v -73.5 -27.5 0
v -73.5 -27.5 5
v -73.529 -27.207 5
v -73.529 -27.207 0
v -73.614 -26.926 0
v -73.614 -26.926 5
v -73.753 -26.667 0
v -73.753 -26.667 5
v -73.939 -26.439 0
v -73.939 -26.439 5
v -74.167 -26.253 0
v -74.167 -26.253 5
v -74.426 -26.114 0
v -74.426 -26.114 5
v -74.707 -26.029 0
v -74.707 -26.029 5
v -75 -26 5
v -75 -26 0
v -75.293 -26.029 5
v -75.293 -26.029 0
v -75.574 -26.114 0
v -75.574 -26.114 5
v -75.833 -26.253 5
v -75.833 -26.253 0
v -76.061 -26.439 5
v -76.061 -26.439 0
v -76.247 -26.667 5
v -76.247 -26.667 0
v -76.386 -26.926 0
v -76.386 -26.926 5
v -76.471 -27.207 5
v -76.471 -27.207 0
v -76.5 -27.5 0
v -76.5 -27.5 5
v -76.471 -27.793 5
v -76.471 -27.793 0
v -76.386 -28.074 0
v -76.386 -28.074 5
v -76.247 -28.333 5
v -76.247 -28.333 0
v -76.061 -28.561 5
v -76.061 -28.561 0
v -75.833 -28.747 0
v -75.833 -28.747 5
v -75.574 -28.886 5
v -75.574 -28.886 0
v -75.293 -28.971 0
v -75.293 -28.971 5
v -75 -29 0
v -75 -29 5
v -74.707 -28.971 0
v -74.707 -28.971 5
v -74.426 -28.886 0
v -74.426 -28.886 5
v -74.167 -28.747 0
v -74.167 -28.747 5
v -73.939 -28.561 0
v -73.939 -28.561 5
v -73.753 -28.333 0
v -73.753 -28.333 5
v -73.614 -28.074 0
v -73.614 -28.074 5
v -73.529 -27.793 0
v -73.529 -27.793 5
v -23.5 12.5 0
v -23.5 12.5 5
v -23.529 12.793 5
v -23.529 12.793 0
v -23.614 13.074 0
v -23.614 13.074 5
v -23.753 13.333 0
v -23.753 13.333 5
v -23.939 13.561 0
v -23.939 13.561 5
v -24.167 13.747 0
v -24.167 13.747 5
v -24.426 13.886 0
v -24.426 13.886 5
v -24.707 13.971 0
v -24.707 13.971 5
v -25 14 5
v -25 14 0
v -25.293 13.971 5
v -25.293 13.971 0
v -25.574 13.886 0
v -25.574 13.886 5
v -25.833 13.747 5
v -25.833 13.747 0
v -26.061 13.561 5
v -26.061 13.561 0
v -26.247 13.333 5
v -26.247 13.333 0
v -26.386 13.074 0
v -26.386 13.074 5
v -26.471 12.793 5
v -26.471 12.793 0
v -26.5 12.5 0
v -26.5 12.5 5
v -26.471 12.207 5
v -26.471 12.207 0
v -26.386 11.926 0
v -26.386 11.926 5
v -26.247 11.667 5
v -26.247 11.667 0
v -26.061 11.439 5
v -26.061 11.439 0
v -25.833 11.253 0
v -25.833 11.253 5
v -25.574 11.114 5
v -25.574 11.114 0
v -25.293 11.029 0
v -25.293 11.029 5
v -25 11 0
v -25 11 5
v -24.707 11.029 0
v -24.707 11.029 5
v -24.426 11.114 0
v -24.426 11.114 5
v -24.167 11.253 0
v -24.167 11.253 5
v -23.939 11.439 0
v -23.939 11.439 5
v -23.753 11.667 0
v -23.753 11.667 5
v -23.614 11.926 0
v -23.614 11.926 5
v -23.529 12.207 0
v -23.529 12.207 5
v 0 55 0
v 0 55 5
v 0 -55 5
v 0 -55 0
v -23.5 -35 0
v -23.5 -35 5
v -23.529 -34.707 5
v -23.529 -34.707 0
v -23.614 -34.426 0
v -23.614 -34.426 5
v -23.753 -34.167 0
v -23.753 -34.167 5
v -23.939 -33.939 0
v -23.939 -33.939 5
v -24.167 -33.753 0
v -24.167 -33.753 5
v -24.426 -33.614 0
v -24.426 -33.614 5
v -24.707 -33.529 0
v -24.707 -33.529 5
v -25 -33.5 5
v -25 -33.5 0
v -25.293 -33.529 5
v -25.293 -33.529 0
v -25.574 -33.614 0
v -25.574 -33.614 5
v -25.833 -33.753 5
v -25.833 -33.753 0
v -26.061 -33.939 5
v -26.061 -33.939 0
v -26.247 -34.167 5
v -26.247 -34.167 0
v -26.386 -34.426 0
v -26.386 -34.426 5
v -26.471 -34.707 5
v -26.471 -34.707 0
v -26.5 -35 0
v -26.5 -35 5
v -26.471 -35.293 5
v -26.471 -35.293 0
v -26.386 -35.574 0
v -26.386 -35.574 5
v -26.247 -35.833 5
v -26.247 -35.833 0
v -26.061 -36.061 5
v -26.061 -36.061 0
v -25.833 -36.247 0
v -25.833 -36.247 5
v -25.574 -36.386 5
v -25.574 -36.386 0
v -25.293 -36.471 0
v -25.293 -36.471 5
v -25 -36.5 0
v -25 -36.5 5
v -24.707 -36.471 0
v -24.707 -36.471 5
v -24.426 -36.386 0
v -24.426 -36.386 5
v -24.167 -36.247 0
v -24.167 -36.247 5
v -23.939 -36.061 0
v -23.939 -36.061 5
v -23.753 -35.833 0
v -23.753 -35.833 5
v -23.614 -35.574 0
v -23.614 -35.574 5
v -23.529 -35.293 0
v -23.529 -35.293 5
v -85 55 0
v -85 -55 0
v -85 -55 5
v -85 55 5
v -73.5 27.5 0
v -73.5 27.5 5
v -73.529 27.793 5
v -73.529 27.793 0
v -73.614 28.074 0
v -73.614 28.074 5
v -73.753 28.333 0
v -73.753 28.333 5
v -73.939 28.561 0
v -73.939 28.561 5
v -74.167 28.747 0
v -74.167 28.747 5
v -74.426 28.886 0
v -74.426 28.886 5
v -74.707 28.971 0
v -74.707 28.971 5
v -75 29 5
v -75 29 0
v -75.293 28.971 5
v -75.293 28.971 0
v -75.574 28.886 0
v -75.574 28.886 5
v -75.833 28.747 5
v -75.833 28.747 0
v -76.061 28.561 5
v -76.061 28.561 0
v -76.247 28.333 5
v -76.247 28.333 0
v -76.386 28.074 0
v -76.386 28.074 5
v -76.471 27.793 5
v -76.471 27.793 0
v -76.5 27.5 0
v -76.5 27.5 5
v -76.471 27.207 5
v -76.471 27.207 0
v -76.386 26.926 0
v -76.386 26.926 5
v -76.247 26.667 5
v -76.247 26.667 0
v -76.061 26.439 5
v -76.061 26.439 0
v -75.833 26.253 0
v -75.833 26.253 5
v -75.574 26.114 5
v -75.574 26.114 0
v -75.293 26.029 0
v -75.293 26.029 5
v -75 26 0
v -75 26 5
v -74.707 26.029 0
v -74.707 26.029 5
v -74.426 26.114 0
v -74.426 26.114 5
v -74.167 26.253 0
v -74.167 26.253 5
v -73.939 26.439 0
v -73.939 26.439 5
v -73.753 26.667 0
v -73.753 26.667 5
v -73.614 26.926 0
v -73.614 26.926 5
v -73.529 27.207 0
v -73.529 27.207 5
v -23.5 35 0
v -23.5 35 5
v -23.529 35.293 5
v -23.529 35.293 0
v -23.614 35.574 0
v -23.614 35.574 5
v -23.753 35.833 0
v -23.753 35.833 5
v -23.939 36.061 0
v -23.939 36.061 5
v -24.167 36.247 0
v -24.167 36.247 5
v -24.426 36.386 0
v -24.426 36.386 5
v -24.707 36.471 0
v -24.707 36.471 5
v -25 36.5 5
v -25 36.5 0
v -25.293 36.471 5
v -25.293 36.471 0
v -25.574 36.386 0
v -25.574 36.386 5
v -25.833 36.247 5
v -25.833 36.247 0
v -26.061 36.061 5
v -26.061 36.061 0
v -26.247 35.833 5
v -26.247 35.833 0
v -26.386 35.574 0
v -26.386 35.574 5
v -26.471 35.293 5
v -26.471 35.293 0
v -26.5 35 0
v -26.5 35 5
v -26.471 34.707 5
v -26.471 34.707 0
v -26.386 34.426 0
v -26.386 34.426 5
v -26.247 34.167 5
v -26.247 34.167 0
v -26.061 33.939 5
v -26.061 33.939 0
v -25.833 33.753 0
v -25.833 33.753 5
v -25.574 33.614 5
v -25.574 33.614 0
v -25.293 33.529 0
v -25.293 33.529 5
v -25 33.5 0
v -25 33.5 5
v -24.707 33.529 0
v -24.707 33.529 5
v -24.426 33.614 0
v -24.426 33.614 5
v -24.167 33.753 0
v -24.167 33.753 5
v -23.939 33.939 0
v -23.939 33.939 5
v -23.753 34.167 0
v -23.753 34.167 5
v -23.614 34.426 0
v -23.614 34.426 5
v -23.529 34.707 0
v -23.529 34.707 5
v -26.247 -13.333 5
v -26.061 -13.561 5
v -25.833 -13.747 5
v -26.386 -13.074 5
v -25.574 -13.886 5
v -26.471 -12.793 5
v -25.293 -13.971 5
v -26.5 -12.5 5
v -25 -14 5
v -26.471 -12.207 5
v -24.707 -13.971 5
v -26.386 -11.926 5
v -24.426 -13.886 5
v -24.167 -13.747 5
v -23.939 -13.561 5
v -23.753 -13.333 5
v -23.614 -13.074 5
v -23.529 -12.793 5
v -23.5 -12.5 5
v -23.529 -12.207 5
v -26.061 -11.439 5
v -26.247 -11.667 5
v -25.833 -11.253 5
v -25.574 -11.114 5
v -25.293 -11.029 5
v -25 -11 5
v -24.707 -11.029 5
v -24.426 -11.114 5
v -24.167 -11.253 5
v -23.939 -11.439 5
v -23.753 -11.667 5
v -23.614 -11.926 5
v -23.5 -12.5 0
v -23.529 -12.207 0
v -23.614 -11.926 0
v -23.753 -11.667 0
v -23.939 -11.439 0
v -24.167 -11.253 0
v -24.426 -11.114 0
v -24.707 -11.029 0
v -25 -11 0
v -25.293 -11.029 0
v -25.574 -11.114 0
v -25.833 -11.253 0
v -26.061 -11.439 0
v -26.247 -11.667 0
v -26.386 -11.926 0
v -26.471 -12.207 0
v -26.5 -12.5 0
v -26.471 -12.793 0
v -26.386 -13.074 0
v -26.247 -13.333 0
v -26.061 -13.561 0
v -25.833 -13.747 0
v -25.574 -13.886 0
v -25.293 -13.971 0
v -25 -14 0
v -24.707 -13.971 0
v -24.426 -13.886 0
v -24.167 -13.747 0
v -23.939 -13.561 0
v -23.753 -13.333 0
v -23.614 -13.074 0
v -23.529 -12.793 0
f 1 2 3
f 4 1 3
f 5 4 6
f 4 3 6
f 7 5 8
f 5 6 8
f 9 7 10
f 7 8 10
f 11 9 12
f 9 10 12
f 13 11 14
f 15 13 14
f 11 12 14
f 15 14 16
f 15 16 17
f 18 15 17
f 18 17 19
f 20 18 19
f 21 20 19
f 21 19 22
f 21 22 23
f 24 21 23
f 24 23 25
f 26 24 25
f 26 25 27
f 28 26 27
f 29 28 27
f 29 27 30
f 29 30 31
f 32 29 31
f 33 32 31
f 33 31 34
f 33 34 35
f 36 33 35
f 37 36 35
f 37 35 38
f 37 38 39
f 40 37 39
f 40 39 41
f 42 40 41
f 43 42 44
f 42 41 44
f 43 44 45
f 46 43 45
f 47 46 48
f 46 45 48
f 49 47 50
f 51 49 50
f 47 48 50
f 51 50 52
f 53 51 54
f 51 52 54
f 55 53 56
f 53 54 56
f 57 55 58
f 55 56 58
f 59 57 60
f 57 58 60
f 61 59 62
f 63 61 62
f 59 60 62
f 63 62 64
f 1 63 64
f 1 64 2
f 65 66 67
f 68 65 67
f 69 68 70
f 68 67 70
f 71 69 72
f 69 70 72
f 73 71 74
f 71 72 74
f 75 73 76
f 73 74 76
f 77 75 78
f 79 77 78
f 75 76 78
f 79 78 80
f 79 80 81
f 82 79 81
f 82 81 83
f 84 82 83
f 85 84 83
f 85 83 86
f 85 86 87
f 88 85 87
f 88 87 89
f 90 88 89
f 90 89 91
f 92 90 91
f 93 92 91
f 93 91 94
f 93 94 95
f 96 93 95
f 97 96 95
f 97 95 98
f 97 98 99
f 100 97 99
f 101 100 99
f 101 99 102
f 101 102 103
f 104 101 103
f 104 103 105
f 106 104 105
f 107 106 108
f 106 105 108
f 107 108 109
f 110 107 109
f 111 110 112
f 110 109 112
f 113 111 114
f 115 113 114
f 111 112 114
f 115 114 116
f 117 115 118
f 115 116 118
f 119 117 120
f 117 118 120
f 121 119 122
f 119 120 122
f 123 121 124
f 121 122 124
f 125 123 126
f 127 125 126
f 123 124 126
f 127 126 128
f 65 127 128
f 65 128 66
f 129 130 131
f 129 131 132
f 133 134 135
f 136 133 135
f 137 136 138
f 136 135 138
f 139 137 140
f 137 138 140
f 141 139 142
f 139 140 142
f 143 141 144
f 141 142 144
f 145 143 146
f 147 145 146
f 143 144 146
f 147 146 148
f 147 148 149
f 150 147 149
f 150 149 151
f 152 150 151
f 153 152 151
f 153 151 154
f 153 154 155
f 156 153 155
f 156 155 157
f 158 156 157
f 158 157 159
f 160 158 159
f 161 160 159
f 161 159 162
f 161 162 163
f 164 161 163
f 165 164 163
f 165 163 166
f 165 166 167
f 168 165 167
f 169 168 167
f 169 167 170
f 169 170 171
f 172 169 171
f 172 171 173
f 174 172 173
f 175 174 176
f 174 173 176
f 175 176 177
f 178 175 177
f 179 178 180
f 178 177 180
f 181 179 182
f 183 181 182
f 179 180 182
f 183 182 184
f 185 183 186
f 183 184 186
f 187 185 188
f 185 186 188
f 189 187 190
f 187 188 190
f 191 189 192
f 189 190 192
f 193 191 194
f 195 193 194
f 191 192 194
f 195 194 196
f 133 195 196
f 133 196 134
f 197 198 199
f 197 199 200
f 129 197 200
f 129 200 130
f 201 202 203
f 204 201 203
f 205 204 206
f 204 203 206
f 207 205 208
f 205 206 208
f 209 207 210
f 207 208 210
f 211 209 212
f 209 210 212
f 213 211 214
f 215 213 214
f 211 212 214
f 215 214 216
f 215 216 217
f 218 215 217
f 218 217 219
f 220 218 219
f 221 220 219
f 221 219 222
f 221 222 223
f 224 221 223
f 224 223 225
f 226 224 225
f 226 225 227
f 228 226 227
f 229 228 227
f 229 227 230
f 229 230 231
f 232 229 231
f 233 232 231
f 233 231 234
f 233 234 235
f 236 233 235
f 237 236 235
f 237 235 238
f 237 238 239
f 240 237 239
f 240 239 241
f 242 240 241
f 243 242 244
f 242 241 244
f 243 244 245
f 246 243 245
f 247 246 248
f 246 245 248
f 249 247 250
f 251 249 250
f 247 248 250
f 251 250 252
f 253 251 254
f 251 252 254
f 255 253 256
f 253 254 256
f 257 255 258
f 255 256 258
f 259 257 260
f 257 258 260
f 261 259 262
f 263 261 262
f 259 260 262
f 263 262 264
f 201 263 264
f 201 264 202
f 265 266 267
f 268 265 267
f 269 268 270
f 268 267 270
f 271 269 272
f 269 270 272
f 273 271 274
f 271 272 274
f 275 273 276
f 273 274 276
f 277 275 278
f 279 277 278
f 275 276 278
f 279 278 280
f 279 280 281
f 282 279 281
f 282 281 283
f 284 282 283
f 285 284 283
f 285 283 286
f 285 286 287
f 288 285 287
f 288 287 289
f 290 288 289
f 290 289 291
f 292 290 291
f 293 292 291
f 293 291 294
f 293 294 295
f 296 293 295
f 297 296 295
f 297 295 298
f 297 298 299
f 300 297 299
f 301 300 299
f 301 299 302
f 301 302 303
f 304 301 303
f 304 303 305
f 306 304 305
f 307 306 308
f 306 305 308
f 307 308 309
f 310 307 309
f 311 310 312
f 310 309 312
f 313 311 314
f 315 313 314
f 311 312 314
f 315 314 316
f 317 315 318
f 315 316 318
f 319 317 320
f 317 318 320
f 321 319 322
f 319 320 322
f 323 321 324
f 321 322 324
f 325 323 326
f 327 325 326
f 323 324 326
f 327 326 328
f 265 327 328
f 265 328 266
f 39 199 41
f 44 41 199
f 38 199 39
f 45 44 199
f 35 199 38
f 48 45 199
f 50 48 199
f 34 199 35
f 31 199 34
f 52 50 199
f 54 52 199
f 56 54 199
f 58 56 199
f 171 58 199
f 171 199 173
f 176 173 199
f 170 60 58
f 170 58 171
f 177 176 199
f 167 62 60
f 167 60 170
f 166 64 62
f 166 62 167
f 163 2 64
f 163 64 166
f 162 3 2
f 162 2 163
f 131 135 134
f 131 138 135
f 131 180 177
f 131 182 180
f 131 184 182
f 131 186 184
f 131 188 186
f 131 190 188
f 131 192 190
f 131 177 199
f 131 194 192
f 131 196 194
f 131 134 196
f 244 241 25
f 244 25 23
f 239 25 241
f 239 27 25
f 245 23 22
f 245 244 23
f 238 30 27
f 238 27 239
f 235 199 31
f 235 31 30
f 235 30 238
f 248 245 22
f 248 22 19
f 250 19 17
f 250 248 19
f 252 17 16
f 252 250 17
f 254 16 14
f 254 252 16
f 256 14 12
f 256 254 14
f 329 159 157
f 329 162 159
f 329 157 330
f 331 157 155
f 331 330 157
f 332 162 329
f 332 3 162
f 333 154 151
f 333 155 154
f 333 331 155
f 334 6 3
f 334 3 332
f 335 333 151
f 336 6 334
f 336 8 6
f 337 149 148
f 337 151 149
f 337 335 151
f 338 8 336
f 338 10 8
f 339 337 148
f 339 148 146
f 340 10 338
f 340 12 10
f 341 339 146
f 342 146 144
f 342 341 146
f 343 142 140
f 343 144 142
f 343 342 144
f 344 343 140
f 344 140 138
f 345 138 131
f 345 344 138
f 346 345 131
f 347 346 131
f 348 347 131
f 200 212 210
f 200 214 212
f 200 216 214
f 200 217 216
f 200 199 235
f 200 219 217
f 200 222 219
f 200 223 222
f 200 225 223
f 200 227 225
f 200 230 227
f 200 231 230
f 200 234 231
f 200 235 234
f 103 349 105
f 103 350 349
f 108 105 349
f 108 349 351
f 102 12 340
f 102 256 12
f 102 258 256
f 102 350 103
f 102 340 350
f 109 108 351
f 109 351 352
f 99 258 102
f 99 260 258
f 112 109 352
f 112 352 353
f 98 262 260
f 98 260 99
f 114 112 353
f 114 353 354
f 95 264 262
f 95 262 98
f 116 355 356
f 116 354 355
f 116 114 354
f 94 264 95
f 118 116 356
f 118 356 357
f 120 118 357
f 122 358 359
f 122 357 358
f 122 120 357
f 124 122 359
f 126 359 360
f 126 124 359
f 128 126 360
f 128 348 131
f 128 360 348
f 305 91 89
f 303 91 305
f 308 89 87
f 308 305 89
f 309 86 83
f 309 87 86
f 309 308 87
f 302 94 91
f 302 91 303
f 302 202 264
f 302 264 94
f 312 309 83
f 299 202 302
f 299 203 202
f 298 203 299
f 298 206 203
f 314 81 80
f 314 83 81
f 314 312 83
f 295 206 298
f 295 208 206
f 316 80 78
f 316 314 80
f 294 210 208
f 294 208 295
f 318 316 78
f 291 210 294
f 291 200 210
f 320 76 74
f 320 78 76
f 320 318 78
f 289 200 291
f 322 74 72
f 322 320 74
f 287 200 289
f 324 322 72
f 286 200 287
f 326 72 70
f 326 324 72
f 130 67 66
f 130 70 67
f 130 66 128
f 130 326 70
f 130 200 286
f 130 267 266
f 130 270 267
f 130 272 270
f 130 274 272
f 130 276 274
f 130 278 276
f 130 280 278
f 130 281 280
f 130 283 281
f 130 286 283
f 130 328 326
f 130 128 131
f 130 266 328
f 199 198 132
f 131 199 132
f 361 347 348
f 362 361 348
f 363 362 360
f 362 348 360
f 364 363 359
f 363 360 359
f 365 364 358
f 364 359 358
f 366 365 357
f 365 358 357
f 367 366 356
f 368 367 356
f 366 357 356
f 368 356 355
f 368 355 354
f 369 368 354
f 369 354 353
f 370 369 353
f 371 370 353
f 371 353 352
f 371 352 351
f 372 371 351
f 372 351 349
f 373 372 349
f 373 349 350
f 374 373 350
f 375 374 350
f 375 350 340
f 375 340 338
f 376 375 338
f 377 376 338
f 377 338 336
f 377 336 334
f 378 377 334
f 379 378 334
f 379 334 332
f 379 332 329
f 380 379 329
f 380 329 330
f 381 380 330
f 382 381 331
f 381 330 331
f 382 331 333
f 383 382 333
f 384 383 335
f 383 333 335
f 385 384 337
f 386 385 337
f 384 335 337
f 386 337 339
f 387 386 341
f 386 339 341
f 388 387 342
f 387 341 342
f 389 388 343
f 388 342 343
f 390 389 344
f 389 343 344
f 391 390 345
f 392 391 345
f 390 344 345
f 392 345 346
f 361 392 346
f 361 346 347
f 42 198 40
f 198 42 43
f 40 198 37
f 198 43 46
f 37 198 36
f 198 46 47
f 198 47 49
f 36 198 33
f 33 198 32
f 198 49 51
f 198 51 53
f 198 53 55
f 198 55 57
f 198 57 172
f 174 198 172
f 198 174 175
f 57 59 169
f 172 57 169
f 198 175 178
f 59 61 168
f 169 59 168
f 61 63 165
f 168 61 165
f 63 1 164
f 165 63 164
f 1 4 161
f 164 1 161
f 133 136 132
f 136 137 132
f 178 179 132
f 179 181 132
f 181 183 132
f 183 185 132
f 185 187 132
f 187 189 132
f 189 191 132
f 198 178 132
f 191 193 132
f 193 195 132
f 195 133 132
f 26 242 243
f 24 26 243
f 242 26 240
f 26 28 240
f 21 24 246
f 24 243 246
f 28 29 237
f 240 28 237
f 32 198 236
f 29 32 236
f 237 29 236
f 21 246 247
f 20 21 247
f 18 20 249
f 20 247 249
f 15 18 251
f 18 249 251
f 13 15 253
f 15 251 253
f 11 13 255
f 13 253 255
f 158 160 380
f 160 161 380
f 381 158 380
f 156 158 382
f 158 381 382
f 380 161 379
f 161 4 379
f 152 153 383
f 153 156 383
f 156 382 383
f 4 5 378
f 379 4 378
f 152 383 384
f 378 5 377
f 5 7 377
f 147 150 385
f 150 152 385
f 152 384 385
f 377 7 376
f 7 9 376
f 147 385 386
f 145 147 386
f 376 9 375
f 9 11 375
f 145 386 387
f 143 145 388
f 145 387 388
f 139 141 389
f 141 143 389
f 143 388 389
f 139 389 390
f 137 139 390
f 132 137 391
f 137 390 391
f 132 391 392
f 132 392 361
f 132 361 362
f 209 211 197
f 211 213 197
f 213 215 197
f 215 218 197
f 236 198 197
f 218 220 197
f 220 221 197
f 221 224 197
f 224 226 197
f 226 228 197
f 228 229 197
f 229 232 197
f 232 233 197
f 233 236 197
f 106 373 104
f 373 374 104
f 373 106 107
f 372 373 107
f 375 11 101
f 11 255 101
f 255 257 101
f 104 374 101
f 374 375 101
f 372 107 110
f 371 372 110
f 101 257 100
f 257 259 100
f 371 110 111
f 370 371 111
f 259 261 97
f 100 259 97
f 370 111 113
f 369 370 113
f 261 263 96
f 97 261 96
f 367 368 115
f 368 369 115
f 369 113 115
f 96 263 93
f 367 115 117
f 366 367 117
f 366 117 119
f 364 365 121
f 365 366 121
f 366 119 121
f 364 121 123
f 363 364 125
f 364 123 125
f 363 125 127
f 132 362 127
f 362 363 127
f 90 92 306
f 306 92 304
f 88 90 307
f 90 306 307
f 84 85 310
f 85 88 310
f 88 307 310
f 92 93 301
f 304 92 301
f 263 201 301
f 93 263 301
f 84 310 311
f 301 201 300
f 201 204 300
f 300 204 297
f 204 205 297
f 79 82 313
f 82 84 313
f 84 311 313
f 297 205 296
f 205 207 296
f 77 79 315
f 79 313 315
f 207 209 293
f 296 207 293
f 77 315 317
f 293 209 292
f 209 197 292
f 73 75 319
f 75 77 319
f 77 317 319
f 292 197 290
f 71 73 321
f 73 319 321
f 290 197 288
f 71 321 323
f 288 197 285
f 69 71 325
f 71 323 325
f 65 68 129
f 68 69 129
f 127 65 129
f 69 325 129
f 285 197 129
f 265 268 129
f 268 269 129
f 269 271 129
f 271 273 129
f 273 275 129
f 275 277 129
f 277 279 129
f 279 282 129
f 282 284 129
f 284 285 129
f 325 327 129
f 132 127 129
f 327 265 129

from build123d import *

# Parameters (mm, degrees)
SKETCH1_W           = 170
SKETCH1_H           = 110
BOSS_EXTRUDE1_DEPTH = 5
SKETCH2_R           = 1.5
CUT_EXTRUDE1_DEPTH  = 6
SKETCH3_R           = 1.5
CUT_EXTRUDE2_DEPTH  = 6
SKETCH4_W           = 40.789310726
SKETCH4_H           = 120.699967799
CUT_EXTRUDE3_DEPTH  = 86


with BuildPart() as part:
    # Sketch1 → Boss-Extrude1 (new body)
    with BuildSketch(Plane.XY):
        Rectangle(SKETCH1_W, SKETCH1_H)
    extrude(amount=BOSS_EXTRUDE1_DEPTH)

    # Sketch2 → Cut-Extrude1 (cut, through all)
    with BuildSketch(Plane.XY.offset(5)):
        with Locations((-75, 27.5)):
            Circle(SKETCH2_R)
        with Locations((-75, -27.5)):
            Circle(SKETCH2_R)
        with Locations((75, -27.5)):
            Circle(SKETCH2_R)
        with Locations((75, 27.5)):
            Circle(SKETCH2_R)
    extrude(amount=-CUT_EXTRUDE1_DEPTH, mode=Mode.SUBTRACT)

    # Sketch3 → Cut-Extrude2 (cut, through all)
    with BuildSketch(Plane.XY.offset(5)):
        with Locations((-25, 35)):
            Circle(SKETCH3_R)
        with Locations((-25, 12.5)):
            Circle(SKETCH3_R)
        with Locations((-25, -12.5)):
            Circle(SKETCH3_R)
        with Locations((-25, -35)):
            Circle(SKETCH3_R)
        with Locations((25, -35)):
            Circle(SKETCH3_R)
        with Locations((25, -12.5)):
            Circle(SKETCH3_R)
        with Locations((25, 12.5)):
            Circle(SKETCH3_R)
        with Locations((25, 35)):
            Circle(SKETCH3_R)
    extrude(amount=-CUT_EXTRUDE2_DEPTH, mode=Mode.SUBTRACT)

    # Sketch4 → Cut-Extrude3 (cut, through all)
    with BuildSketch(Plane(origin=(0, 0, 0), x_dir=(0, 0, -1), z_dir=(1, 0, 0))):
        with Locations((-5.456845945, -1.288881565)):
            Rectangle(SKETCH4_W, SKETCH4_H)
    extrude(amount=CUT_EXTRUDE3_DEPTH, mode=Mode.SUBTRACT)


solid = part.part
